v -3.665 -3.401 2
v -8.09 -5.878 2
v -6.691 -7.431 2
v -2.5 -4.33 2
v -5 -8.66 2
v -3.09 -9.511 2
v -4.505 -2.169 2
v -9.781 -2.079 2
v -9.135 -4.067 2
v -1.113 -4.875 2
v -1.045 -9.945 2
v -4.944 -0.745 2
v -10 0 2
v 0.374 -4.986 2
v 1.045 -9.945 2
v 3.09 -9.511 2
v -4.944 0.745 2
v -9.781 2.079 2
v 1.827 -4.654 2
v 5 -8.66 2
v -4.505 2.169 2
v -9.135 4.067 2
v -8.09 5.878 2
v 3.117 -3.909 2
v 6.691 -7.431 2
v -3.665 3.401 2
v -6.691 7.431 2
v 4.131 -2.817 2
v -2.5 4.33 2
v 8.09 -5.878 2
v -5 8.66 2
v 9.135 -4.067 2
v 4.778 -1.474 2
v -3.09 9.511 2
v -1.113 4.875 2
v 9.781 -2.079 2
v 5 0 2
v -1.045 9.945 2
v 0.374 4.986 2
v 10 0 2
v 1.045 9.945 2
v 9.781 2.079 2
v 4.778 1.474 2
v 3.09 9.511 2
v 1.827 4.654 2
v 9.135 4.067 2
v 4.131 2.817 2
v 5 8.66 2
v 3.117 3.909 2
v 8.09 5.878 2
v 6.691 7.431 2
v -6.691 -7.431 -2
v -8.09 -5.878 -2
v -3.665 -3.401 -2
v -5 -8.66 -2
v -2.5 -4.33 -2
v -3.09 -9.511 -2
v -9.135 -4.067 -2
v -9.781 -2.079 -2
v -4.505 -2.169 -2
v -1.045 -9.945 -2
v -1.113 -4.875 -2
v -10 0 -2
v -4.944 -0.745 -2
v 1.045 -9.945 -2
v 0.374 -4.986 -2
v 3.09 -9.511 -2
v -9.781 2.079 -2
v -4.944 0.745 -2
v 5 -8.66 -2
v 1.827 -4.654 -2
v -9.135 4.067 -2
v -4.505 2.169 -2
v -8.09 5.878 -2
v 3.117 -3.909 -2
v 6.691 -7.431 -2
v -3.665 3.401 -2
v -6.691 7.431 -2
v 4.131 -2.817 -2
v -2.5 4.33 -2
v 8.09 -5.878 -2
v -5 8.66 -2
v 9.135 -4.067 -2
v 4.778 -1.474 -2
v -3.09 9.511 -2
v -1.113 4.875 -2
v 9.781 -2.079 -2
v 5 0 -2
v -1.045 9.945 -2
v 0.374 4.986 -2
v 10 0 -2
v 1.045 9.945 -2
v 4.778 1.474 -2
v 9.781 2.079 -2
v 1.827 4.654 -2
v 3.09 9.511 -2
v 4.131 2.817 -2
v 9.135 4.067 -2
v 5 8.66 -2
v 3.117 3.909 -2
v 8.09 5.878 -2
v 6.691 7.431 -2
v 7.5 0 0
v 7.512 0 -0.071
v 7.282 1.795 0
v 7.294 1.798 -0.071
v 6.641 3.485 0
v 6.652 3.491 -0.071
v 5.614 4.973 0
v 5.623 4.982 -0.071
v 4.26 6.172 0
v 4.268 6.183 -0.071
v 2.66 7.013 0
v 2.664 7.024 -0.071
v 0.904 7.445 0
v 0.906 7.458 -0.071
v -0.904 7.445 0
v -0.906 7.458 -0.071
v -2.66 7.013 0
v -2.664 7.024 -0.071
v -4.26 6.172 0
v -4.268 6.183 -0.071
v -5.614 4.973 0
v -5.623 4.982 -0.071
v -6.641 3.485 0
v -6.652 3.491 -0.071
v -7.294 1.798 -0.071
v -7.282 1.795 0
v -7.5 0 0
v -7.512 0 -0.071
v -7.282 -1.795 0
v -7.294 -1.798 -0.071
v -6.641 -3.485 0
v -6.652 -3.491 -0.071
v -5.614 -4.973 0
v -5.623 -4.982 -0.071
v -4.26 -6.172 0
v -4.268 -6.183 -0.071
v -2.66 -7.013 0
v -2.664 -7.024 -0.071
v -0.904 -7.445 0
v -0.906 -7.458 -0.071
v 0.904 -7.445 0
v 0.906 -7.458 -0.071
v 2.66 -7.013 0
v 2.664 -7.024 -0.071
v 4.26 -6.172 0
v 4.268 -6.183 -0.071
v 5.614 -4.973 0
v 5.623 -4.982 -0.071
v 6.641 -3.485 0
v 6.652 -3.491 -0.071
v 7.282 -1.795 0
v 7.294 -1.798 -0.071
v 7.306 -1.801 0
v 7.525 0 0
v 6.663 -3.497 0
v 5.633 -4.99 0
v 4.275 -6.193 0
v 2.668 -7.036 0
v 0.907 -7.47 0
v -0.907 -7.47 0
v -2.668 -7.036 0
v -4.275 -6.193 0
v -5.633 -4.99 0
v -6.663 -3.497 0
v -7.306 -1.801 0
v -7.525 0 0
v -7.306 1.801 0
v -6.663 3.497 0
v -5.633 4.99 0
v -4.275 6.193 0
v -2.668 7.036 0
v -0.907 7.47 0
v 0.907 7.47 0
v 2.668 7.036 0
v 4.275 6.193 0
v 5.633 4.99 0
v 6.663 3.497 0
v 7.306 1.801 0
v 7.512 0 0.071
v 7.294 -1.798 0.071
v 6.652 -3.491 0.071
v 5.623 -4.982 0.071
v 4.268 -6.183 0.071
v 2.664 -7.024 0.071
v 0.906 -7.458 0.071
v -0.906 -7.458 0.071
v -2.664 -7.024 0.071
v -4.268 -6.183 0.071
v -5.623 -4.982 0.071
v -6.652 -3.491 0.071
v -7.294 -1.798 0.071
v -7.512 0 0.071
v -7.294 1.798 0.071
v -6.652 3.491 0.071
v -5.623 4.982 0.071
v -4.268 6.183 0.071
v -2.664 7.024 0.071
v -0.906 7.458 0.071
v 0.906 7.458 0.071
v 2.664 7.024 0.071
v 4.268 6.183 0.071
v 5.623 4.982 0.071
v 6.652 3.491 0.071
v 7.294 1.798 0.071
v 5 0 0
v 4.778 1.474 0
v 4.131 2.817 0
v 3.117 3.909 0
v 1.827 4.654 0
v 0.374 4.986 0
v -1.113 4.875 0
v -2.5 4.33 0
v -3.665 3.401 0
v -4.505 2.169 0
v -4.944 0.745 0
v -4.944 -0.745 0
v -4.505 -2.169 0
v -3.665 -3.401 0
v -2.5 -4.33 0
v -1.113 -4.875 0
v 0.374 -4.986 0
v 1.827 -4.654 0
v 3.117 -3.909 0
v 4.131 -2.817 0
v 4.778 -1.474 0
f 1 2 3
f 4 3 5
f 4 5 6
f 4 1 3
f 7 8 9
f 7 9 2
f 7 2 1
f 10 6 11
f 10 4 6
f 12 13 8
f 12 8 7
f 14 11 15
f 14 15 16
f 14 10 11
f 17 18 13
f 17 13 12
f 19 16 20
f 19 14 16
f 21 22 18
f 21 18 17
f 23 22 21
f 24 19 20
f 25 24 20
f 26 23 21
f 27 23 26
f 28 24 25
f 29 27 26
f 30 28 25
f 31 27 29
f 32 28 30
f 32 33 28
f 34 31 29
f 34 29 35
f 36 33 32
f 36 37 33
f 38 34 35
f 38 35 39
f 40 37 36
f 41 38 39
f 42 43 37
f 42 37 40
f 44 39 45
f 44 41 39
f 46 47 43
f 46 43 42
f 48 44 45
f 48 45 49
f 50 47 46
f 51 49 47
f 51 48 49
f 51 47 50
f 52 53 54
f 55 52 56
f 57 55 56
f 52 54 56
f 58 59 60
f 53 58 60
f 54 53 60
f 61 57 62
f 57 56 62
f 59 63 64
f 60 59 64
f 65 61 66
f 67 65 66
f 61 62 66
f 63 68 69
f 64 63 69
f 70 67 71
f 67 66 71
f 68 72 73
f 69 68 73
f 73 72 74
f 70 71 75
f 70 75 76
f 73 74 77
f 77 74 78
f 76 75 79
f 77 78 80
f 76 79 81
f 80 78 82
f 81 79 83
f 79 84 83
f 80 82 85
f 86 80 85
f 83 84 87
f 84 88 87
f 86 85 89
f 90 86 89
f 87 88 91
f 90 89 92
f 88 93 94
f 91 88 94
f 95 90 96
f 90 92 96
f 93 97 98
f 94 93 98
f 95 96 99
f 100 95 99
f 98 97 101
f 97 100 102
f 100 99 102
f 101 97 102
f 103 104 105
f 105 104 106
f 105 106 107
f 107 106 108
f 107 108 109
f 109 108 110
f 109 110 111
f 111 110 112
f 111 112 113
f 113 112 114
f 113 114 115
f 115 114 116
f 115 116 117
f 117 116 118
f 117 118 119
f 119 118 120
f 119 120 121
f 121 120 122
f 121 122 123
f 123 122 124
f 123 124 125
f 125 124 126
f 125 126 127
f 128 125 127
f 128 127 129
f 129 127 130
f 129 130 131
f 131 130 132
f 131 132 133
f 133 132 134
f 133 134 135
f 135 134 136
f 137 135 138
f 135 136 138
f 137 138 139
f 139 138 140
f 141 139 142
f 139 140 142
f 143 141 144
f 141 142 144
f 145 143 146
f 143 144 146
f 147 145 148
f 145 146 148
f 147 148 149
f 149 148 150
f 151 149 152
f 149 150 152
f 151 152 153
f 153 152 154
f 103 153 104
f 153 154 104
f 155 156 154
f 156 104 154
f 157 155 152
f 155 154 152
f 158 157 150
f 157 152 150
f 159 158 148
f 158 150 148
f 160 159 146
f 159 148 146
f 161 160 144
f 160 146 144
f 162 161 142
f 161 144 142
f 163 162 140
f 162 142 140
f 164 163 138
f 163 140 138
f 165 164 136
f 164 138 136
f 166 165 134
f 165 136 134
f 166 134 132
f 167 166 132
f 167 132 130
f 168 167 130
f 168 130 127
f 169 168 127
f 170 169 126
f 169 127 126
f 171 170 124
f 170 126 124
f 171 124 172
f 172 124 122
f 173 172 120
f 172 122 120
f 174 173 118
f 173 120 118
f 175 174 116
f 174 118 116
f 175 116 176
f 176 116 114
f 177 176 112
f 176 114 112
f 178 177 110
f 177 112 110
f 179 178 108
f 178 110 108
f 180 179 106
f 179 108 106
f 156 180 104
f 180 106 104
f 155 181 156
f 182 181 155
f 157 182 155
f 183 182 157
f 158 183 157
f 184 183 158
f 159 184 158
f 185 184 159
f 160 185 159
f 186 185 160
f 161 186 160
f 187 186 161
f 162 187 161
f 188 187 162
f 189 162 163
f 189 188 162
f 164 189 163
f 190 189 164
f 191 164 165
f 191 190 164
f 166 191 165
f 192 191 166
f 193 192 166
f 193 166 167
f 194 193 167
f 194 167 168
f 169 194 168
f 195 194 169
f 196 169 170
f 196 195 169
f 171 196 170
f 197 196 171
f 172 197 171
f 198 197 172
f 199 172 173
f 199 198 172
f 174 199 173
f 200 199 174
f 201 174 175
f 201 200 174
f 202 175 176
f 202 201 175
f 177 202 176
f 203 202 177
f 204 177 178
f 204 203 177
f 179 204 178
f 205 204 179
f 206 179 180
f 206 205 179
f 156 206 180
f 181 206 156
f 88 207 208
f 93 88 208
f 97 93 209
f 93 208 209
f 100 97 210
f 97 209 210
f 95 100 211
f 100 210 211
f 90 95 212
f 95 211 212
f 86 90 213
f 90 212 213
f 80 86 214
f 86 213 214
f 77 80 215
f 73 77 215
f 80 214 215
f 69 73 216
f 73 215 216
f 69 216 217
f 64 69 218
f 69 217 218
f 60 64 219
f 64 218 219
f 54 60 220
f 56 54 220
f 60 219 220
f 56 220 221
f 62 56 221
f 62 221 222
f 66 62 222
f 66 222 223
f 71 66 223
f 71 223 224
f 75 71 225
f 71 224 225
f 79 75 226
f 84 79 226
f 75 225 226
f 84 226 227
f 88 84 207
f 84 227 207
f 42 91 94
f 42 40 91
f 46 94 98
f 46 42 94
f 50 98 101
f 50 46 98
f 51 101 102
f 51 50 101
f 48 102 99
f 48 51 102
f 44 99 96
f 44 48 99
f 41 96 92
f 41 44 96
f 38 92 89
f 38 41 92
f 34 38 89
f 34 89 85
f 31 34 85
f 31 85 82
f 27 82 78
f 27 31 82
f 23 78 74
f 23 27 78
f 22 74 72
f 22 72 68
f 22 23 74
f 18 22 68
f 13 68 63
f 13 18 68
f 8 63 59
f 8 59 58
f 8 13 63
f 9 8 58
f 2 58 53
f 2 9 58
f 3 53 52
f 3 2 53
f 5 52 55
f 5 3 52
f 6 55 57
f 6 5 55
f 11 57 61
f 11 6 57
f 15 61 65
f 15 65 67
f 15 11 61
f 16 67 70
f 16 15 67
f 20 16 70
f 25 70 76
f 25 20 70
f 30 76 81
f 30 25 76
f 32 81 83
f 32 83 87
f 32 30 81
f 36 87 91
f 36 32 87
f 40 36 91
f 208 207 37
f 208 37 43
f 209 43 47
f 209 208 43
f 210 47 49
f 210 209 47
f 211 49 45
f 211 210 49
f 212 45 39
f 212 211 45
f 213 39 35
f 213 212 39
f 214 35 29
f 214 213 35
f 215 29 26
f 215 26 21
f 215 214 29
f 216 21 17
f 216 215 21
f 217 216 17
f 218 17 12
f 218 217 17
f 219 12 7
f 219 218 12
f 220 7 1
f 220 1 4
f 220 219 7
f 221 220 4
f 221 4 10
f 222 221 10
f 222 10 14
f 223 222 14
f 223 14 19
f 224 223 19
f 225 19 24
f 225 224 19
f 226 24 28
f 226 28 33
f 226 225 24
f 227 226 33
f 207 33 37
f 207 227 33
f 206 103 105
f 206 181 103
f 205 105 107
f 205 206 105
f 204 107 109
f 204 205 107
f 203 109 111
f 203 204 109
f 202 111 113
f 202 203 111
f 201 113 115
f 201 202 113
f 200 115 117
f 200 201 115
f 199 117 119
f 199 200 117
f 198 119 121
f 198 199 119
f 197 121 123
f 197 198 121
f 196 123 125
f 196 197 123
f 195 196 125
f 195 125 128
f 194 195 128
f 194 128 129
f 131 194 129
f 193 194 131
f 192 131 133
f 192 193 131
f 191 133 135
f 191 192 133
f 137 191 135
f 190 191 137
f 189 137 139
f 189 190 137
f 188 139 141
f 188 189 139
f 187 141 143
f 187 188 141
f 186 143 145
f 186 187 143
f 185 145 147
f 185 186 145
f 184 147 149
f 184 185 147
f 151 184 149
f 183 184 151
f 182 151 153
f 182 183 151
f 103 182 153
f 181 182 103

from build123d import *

# Parameters (mm, degrees)
F0_R          = 10
F0_R_2        = 7.525
F1_DEPTH      = 2
F1_TAPER      = -10
F1_DEPTH_BACK = 2
F1_TAPER_BACK = -10
F0_R_3        = 7.5
F0_R_4        = 5
F2_DEPTH      = 2
F2_TAPER      = -10
F2_DEPTH_BACK = 2
F2_TAPER_BACK = -10
F3_R          = 12.6754374972
F3_R_2        = 10
F4_DEPTH      = 2
F4_DEPTH_BACK = 2
F5_R          = 5
F5_R_2        = 1.8774489935
F6_DEPTH      = 2
F6_DEPTH_BACK = 2


with BuildPart() as f1:
    # F0 (on Top) → F1 (new body, two sides)
    with BuildSketch(Plane.XY) as f1_sk:
        Circle(F0_R)
        Circle(F0_R_2, mode=Mode.SUBTRACT)
    extrude(amount=F1_DEPTH, taper=F1_TAPER)
    extrude(f1_sk.sketch, amount=-F1_DEPTH_BACK, taper=F1_TAPER_BACK)

    # F0 (on Top) → F2 (join, two sides)
    with BuildSketch(Plane.XY) as f2_sk:
        Circle(F0_R_3)
        Circle(F0_R_4, mode=Mode.SUBTRACT)
    extrude(amount=F2_DEPTH, taper=F2_TAPER)
    extrude(f2_sk.sketch, amount=-F2_DEPTH_BACK, taper=F2_TAPER_BACK)

    # F3 (on Top) → F4 (cut, two sides)
    with BuildSketch(Plane.XY) as f4_sk:
        Circle(F3_R)
        Circle(F3_R_2, mode=Mode.SUBTRACT)
    extrude(amount=-F4_DEPTH, mode=Mode.SUBTRACT)
    extrude(f4_sk.sketch, amount=F4_DEPTH_BACK, mode=Mode.SUBTRACT)

    # F5 (on Top) → F6 (cut, two sides)
    with BuildSketch(Plane.XY) as f6_sk:
        Circle(F5_R)
        Circle(F5_R_2, mode=Mode.SUBTRACT)
    extrude(amount=-F6_DEPTH, mode=Mode.SUBTRACT)
    extrude(f6_sk.sketch, amount=F6_DEPTH_BACK, mode=Mode.SUBTRACT)


solid = f1.part
